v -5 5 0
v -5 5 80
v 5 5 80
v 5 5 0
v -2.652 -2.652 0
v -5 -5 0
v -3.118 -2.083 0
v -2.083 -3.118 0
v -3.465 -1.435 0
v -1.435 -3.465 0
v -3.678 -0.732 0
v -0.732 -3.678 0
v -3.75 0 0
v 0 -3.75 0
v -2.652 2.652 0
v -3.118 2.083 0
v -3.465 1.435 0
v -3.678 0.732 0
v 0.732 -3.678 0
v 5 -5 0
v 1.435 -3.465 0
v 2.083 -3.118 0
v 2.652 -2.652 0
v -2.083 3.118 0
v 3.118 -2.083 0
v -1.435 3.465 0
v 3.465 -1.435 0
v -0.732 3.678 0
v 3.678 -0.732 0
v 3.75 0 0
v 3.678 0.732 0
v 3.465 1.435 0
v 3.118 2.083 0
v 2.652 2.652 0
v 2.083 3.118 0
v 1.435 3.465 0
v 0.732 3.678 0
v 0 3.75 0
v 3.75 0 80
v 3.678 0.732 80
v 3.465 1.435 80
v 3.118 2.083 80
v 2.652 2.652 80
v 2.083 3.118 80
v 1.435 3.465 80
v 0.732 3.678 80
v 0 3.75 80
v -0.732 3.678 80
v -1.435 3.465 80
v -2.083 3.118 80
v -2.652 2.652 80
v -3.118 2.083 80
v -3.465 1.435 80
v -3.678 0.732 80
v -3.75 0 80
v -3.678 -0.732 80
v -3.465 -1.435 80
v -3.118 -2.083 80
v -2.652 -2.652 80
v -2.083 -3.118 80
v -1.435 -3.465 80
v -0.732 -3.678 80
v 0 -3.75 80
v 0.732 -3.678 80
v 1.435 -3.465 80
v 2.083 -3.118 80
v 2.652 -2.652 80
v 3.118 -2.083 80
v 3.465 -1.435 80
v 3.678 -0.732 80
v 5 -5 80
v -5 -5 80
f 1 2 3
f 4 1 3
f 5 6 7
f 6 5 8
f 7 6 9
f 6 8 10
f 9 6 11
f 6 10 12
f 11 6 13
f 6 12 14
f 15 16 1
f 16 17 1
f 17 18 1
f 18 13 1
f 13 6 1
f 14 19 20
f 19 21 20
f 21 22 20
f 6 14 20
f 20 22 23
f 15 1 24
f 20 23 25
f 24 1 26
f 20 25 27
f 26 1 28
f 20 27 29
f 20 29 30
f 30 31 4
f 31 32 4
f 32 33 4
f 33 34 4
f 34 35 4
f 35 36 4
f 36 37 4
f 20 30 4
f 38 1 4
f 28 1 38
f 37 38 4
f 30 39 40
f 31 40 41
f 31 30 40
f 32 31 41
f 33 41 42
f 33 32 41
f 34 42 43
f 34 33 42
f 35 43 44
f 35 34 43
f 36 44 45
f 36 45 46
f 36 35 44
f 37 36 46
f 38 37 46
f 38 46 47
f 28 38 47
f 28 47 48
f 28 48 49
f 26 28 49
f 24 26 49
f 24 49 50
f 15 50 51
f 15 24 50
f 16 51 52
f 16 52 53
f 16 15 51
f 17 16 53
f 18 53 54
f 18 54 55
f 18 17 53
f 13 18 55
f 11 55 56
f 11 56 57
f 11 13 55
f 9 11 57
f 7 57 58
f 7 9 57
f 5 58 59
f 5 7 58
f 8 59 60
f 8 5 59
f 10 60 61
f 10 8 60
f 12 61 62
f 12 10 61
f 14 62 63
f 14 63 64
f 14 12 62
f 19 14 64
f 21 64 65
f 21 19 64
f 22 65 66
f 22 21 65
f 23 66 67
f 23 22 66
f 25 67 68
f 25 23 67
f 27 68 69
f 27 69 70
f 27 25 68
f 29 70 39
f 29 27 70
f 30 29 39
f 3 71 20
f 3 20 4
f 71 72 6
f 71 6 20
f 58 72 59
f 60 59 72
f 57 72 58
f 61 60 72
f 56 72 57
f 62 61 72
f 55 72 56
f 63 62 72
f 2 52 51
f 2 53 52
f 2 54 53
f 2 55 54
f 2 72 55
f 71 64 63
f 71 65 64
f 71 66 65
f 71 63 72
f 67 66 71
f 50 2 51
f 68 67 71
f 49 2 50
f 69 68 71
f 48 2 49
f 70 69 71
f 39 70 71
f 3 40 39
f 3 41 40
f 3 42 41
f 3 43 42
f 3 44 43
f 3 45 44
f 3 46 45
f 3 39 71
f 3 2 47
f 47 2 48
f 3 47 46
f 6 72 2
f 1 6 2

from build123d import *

# Parameters (mm, degrees)
F0_W      = 10
F0_H      = 10
F0_R      = 3.75
F1_DEPTH  = 70
F1_FACE_W = 10
F1_FACE_H = 10
F1_FACE_R = 3.75
F2_DEPTH  = 10


with BuildPart() as f1:
    # F0 (on Top) → F1 (new body)
    with BuildSketch(Plane.XY):
        Rectangle(F0_W, F0_H)
        Circle(F0_R, mode=Mode.SUBTRACT)
    extrude(amount=F1_DEPTH)

    # F1_face (on face) → F2 (join)
    with BuildSketch(Plane.XY.offset(70)):
        Rectangle(F1_FACE_W, F1_FACE_H)
        Circle(F1_FACE_R, mode=Mode.SUBTRACT)
    extrude(amount=F2_DEPTH)


solid = f1.part
